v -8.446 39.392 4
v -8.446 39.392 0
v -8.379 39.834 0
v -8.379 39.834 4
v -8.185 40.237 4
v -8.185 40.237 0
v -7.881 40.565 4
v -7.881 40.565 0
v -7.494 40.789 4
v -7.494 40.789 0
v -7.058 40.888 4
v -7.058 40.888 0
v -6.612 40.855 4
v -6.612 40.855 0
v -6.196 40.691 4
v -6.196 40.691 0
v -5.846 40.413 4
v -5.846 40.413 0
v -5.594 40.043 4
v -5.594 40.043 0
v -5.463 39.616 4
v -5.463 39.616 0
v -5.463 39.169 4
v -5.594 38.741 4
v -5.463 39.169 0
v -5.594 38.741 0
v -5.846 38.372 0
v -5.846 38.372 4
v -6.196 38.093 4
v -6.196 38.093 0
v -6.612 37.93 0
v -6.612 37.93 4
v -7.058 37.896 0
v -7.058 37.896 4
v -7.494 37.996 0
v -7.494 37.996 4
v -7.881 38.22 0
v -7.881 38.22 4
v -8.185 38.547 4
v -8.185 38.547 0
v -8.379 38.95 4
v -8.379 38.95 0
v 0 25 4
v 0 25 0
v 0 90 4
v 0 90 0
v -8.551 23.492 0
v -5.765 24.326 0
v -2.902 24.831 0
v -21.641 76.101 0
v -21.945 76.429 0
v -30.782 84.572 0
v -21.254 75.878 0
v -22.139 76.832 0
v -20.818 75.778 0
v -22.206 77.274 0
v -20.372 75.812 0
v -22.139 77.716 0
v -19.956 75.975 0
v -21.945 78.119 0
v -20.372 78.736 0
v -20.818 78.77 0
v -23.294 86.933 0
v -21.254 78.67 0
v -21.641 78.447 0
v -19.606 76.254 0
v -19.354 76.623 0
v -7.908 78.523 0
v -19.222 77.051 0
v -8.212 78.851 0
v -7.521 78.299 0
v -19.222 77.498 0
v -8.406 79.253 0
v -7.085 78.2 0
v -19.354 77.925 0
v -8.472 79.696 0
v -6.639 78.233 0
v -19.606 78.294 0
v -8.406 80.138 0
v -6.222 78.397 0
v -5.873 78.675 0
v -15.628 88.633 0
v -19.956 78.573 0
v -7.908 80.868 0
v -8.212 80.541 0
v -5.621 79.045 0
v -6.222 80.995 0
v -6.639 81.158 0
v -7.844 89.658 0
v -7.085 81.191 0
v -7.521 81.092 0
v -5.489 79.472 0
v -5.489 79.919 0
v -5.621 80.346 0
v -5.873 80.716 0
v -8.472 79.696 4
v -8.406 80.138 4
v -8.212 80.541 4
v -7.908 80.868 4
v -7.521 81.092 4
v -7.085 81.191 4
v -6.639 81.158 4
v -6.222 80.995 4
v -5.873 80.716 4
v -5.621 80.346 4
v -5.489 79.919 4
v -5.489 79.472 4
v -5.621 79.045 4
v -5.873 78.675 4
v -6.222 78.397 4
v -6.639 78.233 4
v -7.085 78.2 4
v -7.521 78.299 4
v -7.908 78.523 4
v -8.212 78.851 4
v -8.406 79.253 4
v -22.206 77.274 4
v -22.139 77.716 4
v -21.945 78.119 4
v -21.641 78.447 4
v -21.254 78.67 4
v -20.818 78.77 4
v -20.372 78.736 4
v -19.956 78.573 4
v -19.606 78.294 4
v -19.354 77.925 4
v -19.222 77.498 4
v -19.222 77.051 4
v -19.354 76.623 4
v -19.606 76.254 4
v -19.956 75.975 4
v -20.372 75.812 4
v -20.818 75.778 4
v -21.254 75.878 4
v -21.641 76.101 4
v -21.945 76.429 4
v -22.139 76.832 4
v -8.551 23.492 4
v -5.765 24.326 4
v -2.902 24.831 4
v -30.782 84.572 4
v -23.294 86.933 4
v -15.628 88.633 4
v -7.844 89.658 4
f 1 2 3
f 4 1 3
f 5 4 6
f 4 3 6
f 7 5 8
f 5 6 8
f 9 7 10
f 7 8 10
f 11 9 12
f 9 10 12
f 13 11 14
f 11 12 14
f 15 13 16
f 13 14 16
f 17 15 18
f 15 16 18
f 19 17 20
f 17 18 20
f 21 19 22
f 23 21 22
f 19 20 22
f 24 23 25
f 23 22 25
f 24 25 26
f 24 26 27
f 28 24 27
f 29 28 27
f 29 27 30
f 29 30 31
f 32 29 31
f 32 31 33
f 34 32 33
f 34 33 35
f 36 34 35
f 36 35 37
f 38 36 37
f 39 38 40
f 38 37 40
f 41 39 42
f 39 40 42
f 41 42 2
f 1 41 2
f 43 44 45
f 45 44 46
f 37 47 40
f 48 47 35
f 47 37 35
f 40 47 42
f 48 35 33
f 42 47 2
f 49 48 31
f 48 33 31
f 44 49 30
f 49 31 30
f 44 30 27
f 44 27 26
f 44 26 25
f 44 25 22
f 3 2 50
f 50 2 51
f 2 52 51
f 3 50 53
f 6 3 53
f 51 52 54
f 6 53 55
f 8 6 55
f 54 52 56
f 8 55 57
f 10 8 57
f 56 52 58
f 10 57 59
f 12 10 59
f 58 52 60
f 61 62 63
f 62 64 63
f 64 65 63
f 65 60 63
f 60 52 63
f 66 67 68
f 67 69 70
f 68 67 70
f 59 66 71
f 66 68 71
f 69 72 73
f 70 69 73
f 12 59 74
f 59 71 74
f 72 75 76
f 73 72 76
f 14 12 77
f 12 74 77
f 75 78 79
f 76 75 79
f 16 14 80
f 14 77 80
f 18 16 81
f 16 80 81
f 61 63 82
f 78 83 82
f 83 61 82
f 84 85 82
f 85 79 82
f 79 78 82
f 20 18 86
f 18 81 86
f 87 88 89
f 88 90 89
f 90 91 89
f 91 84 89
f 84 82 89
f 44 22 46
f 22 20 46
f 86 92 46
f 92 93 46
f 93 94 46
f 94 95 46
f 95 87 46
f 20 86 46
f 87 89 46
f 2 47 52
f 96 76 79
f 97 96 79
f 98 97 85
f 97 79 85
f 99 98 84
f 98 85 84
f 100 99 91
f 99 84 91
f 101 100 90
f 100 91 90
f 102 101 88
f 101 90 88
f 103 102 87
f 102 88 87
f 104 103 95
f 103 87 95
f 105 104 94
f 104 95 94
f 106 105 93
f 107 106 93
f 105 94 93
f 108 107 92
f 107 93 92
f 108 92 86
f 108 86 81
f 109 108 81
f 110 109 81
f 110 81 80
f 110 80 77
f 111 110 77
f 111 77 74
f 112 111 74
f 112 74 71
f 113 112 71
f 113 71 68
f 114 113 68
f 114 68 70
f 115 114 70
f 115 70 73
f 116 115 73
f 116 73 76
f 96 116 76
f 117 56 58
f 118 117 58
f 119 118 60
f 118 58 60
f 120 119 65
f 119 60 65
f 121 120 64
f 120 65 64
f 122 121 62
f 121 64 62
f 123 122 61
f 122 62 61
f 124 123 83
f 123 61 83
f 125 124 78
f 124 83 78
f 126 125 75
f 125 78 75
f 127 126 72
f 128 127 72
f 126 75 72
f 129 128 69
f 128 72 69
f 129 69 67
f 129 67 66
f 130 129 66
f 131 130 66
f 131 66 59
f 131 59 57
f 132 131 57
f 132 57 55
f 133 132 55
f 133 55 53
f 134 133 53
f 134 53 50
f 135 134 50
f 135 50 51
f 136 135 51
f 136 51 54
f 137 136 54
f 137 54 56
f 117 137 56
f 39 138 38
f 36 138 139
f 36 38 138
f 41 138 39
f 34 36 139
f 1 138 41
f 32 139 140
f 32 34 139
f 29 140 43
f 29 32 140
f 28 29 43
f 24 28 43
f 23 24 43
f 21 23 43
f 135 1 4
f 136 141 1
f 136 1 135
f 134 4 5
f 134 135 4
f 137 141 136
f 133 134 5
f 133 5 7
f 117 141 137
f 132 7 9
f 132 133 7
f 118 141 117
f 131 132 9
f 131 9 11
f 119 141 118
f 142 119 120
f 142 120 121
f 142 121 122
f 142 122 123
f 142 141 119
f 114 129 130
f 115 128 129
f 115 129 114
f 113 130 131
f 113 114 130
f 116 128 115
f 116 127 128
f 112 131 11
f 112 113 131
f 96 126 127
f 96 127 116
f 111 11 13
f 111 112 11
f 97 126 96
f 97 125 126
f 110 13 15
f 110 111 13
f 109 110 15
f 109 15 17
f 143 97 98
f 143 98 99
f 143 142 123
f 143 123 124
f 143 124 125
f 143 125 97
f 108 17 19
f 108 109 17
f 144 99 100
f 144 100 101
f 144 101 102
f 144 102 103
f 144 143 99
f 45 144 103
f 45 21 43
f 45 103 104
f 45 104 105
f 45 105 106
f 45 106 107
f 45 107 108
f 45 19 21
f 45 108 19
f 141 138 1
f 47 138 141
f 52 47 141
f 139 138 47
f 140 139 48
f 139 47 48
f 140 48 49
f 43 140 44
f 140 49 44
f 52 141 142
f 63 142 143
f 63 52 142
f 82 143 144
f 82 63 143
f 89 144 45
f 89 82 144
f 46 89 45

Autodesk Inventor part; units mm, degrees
ref_plane "YZ Plane" through (0, 0, 0) normal (1, 0, 0) x (0, 1, 0)
ref_plane "XZ Plane" through (0, 0, 0) normal (0, 1, 0) x (-1, 0, 0)
ref_plane "XY Plane" through (0, 0, 0) normal (0, 0, 1) x (1, 0, 0)
sketch "Sketch1" plane through (0, 0, 0) normal (0, 0, 1) x (1, 0, 0)
  arc A0 (0, 90) -> (77.9423, -45) centre (0, 0) ccw
  arc A1 (0, 25) -> (21.6506, -12.5) centre (0, 0) ccw
  line L0 (0, 25) -> (0, 90)
  line L1 (77.9423, -45) -> (21.6506, -12.5)
  line L2 (0, 25) -> (0, 0)
  line L3 (0, 0) -> (21.6506, -12.5)
  line L4 (0, -167.6192) -> (0, 145.1192) projected
  dimension "d0" = 120
  dimension "d1" = 25
  dimension "d2" = 90
extrude "Extrusion1" add sketch "Sketch1" along normal blind 4 contours L0 A1 L4 A0 | L4 A1 L1 A0
sketch "Sketch2" plane through (0, 0, 0) normal (0, 0, -1) x (-1, 0, 0)
  circle A0 centre (6.9725, 79.6956) radius 1.5
  circle A1 centre (20.7055, 77.2741) radius 1.5
  circle A2 centre (6.9459, 39.3923) radius 1.5
  line L0 (6.9725, 79.6956) -> (0, 0)
  line L1 (0, 0) -> (6.9459, 39.3923)
  line L2 (20.7055, 77.2741) -> (0, 0)
  line L3 (0, 25) -> (0, 90) projected
  dimension "d14" = 3
  dimension "d15" = 3
  dimension "d16" = 3
  dimension "d17" = 80
  dimension "d18" = 80
  dimension "d19" = 40
  dimension "d20" = 10
  dimension "d21" = 5
  dimension "d22" = 15
extrude "Extrusion2" cut sketch "Sketch2" against normal blind 10
pattern_circular "Circular Pattern1" count 12 over 220 about axis through (0, 0, 0) along (0, 0, 1) of "Extrusion2"
sketch "Sketch3" plane through (0, 0, 4) normal (0, 0, 1) x (1, 0, 0)
  point P0 (0, 0)
sketch "Sketch4" plane through (0, 0, 4) normal (0, 0, 1) x (1, 0, 0)
  arc A0 (0, 25) -> (21.6506, -12.5) centre (0, 0) ccw projected
  line L0 (0, 0) -> (-30.7818, 84.5723)
  line L1 (0, 25) -> (0, 90) projected
  line L2 (0, 0) -> (77.9423, -45)
  arc A1 (-30.7818, 84.5723) -> (77.9423, -45) centre (0, 0) ccw
  point P0 (21.6506, -12.5)
  point P1 (-8.5505, 23.4923)
  dimension "d29" = 20
extrude "Extrusion3" cut sketch "Sketch4" against normal blind 10 contours A0 L2 A1 L0
properties part number "cover"
